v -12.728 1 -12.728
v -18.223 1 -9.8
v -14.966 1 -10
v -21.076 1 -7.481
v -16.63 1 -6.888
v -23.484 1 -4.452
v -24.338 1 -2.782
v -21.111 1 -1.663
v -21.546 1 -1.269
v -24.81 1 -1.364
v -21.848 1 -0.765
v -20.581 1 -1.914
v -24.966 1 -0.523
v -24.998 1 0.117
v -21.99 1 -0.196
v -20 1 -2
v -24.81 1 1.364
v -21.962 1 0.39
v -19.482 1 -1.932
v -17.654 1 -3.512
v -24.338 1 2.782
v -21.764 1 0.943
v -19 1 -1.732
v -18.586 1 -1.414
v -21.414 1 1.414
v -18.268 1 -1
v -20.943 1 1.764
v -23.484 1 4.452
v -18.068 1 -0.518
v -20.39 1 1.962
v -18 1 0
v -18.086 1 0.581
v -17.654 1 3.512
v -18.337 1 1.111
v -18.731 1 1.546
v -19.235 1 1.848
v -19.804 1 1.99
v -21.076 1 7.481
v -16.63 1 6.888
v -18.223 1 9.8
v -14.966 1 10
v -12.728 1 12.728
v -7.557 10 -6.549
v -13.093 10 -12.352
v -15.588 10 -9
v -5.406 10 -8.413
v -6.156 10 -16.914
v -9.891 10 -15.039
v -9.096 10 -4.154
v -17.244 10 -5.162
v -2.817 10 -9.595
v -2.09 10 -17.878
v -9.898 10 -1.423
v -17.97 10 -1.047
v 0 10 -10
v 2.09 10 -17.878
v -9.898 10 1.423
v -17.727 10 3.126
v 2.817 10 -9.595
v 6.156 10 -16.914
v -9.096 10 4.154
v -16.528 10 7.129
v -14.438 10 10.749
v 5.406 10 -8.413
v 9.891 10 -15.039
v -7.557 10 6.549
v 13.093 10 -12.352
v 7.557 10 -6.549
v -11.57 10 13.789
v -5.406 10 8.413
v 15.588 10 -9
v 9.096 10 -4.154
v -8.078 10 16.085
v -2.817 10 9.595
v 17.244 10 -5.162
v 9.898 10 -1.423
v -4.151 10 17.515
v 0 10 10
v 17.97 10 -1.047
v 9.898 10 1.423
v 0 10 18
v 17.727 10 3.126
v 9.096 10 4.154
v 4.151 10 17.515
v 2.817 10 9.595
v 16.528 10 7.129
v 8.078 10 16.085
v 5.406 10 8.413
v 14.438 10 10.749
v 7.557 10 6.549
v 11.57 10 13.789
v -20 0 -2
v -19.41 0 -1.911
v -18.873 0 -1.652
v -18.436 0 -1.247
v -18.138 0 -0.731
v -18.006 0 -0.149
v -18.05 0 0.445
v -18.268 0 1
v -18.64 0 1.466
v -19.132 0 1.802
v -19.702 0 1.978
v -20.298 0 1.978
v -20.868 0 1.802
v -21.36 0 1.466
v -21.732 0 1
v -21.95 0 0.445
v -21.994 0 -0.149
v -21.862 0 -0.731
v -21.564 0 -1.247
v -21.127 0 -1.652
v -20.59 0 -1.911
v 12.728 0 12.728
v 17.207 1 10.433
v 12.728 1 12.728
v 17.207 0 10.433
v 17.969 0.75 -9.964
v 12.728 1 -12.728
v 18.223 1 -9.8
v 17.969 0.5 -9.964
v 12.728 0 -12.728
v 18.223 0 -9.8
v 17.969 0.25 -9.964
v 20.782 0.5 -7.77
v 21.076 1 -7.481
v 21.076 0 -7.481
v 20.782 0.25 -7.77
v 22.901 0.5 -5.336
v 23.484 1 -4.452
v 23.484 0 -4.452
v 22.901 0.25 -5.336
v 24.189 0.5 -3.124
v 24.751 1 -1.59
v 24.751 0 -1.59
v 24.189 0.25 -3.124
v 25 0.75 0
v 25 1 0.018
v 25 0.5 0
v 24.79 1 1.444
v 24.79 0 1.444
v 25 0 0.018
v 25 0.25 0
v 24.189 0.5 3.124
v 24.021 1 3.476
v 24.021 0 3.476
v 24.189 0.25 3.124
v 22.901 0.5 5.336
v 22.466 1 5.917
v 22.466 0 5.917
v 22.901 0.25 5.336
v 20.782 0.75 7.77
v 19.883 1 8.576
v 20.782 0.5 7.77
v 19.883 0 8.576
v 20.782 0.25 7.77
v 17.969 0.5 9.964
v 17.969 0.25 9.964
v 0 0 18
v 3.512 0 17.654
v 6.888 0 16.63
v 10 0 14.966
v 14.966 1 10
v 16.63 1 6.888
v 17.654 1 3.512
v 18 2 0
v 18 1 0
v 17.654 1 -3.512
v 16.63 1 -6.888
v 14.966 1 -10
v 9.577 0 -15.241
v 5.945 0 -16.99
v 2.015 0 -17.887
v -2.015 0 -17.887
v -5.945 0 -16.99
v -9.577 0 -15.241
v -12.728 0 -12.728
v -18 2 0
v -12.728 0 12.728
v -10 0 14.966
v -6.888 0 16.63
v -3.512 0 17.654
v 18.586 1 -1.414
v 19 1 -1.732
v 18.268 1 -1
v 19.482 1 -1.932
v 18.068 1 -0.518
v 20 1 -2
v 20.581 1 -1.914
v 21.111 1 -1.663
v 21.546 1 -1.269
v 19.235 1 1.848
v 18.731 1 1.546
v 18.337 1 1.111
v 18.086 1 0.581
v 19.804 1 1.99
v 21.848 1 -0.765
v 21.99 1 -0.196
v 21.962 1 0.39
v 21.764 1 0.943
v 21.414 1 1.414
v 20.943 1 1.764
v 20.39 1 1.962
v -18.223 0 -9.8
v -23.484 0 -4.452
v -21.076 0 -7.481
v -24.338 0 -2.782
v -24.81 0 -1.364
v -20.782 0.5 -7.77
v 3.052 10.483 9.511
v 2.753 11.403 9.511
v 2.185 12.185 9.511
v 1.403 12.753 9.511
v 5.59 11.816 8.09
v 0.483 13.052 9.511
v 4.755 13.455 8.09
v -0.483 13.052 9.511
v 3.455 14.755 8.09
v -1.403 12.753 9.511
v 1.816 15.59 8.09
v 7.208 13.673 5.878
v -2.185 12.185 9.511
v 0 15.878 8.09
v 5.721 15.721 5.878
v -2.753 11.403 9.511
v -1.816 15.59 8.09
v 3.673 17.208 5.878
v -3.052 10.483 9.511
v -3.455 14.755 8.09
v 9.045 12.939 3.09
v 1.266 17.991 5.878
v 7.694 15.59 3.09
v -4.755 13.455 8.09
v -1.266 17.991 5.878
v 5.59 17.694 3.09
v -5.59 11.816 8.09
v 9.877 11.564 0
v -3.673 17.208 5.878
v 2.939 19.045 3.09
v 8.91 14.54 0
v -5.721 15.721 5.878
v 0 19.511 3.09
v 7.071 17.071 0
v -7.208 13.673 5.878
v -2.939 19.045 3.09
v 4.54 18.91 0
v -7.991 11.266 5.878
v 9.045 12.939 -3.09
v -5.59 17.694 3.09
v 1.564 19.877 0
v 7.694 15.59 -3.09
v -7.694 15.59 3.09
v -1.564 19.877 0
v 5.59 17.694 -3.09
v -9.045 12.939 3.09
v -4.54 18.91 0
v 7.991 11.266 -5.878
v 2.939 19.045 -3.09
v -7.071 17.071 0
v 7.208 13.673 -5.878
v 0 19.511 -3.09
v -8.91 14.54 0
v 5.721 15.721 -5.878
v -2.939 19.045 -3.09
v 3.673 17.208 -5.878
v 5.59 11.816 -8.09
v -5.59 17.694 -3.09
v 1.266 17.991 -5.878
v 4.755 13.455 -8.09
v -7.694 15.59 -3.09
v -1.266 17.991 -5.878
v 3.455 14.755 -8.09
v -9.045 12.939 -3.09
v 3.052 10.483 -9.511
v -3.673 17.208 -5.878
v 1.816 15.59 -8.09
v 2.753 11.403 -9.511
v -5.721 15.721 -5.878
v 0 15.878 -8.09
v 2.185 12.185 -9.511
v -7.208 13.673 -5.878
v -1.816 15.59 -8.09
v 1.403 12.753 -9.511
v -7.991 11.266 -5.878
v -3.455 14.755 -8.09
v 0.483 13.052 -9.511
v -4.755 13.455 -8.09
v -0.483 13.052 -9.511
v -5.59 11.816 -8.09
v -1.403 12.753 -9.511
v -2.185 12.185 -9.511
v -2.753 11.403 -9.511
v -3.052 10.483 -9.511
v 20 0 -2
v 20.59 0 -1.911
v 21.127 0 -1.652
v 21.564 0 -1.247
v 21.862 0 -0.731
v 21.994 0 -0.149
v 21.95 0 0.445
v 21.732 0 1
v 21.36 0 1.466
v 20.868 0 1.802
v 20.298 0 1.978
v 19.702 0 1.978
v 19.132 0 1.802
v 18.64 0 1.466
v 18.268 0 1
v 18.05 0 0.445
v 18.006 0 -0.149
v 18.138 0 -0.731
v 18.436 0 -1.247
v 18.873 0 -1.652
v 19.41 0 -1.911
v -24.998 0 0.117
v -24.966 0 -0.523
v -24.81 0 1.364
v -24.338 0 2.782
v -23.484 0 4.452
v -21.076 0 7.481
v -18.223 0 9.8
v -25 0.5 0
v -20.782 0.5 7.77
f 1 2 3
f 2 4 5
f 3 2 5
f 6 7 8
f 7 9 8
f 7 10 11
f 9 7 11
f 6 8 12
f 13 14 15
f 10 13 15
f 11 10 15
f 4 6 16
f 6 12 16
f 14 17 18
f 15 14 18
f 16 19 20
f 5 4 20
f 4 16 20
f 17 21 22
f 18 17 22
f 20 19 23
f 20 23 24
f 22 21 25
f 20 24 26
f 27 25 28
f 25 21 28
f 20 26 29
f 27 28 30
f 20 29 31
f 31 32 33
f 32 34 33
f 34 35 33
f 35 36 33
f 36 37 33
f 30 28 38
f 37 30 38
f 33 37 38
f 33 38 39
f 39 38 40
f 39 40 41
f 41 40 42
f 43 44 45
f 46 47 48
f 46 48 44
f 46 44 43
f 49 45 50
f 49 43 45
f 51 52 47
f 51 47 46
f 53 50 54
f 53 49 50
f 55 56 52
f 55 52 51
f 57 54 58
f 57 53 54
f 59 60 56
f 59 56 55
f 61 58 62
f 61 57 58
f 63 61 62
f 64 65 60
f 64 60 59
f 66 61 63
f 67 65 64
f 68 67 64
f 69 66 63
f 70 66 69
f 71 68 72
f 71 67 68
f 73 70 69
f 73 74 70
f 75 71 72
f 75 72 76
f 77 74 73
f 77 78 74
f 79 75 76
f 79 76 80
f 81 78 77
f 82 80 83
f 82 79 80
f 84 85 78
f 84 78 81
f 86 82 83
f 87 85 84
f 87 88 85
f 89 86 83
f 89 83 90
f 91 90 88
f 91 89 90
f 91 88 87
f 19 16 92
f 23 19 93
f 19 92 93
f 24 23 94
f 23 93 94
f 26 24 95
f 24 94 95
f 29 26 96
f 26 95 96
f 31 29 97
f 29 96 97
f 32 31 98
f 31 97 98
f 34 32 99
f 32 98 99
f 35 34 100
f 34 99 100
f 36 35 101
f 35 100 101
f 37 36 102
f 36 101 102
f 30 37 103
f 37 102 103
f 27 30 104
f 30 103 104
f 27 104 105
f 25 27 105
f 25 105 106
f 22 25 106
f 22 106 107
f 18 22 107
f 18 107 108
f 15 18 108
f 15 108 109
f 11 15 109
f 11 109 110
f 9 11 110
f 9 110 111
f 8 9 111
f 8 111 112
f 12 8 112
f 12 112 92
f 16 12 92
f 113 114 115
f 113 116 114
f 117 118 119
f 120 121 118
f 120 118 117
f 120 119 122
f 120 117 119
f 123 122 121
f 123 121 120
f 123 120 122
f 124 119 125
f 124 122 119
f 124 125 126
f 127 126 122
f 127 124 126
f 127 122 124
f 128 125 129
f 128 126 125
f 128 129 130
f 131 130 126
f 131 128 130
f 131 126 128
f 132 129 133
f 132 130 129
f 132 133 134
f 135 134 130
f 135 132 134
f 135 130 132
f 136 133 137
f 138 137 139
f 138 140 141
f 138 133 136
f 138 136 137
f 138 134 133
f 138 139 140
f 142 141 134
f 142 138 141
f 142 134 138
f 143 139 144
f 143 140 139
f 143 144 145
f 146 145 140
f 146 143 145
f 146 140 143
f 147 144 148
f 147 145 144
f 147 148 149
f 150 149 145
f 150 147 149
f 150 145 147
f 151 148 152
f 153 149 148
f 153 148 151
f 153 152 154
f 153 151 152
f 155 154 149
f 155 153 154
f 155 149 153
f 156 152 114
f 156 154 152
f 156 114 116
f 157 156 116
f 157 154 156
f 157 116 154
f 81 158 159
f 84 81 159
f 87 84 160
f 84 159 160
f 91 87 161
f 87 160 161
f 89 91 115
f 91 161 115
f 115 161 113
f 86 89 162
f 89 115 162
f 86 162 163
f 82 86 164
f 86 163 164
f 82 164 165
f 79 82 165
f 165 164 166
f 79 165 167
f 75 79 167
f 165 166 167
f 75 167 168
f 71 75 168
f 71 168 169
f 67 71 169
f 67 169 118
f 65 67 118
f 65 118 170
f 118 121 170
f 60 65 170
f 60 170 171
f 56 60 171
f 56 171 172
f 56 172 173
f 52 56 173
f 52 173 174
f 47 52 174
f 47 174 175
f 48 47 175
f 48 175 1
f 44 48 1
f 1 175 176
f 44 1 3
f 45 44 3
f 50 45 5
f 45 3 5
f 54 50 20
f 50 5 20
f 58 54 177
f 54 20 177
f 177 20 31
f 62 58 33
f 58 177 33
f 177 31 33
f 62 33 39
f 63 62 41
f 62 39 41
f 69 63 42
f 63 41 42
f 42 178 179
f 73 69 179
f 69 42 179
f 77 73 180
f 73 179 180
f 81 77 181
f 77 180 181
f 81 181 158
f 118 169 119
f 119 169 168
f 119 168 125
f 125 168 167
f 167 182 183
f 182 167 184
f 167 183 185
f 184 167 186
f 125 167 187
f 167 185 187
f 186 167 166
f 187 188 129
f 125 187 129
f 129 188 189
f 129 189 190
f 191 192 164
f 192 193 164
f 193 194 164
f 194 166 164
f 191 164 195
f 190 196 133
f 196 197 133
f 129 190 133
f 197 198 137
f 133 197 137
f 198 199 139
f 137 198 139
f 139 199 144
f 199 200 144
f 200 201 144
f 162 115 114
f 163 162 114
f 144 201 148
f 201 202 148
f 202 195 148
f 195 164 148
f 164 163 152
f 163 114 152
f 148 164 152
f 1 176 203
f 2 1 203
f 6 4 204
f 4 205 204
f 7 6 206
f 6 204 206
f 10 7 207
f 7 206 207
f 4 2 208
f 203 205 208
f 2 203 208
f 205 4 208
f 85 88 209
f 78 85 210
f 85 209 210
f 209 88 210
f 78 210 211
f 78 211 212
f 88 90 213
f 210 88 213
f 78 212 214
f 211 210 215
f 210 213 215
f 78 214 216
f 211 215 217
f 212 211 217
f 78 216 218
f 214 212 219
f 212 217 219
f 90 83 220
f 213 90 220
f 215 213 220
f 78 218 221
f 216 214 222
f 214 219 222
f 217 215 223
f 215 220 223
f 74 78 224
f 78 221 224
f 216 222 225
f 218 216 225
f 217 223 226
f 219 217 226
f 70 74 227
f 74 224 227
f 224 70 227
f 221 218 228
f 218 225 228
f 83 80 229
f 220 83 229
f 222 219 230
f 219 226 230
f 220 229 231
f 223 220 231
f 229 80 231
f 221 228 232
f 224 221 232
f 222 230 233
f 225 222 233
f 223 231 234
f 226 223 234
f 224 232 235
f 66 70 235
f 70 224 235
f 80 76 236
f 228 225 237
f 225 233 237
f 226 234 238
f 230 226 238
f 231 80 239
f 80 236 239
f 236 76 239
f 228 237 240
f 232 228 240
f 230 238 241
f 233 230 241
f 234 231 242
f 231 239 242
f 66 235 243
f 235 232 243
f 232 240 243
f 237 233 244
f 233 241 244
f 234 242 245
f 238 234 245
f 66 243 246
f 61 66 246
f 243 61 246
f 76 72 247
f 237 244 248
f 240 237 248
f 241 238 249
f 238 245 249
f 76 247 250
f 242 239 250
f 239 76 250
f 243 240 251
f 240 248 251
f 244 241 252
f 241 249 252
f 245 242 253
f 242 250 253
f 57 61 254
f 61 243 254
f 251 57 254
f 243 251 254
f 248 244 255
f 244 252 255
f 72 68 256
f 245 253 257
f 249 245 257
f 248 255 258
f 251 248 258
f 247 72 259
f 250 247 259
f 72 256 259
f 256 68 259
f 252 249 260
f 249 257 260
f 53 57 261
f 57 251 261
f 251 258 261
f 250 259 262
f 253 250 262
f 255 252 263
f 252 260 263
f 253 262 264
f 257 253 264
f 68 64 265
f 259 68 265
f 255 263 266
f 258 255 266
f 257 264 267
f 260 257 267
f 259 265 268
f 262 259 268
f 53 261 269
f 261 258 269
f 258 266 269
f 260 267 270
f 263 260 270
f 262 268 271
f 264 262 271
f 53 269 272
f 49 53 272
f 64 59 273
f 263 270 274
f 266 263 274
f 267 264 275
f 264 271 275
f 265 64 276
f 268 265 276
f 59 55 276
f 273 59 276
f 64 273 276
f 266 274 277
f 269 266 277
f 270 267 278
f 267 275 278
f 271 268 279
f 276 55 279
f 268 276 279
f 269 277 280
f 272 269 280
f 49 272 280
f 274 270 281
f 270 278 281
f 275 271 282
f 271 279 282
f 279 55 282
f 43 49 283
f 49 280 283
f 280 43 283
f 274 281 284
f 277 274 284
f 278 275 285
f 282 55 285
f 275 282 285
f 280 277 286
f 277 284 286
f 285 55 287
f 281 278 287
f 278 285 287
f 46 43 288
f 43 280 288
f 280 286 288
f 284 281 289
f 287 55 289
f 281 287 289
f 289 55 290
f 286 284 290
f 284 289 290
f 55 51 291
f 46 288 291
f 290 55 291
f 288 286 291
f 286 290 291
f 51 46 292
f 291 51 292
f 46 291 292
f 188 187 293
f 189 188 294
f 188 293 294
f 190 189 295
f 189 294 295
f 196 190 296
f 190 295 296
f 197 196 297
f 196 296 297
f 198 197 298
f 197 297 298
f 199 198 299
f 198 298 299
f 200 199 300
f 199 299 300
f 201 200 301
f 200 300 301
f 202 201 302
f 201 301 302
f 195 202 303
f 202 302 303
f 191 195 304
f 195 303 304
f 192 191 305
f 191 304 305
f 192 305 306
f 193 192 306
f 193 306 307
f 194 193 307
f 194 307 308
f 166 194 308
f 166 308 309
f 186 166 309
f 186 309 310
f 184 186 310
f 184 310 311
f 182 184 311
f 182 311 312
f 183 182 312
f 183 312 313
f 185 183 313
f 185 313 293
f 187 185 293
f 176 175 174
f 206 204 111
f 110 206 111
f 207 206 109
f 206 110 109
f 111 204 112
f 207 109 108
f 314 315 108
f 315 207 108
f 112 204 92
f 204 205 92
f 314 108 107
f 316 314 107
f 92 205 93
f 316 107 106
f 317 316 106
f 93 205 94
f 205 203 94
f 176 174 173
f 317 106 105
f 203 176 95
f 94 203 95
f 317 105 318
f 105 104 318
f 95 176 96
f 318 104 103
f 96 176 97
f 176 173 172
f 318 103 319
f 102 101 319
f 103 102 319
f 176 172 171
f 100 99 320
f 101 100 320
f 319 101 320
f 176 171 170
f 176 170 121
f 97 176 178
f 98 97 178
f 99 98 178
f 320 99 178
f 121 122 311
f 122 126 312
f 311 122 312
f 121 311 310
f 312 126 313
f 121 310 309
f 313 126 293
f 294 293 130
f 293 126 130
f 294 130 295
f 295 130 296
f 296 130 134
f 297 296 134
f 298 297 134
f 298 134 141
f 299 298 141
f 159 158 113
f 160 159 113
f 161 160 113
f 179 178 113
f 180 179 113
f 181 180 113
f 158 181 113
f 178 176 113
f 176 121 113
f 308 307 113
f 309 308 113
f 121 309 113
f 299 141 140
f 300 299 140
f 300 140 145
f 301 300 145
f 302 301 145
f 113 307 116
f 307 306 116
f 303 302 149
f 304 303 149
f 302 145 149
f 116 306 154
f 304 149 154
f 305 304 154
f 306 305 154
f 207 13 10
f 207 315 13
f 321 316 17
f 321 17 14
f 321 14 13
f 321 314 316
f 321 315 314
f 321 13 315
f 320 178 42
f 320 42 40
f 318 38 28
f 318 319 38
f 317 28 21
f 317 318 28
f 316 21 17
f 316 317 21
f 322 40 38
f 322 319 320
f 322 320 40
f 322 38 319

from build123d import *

# Parameters (mm, degrees)
SKETCH1_R            = 18
BOSS_EXTRUDE1_DEPTH  = 10
SKETCH2_R            = 2
BOSS_EXTRUDE11_DEPTH = 1
SKETCH3_R            = 2
CUT_EXTRUDE1_DEPTH   = 2


with BuildPart() as part:
    # Sketch1 → Boss-Extrude1 (new body)
    with BuildSketch(Plane(origin=(0, 0, 0), x_dir=(1, 0, 0), z_dir=(0, 1, 0))):
        with Locations(Location((0, 0, 0), (0, 0, 270))):
            Circle(SKETCH1_R)
    extrude(amount=BOSS_EXTRUDE1_DEPTH)

    # Sketch2 → Boss-Extrude11 (add)
    with BuildSketch(Plane.XZ):
        with BuildLine():
            ThreePointArc((-12.727922061, -12.727922061), (-16.629831585, -6.888301783), (-18, 0))
            ThreePointArc((-18, 0), (-16.629831585, 6.888301783), (-12.727922061, 12.727922061))
            add(Edge.make_bspline(
                [(-12.727922061, 12.727922061), (-17.413514116, 10.578941286), (-22.725992236, 6.653009013), (-24.419739959, 2.952843449), (-24.810237614, 1.3644098)],
                knots=[0, 0, 0, 0, 0.294966877, 0.815844303, 0.815844303, 0.815844303, 0.815844303], degree=3))
            add(Edge.make_bspline(
                [(-24.810237614, 1.3644098), (-24.948297671, 0.80282066), (-25, 0.337972177), (-25, 0)],
                knots=[0.815844303, 0.815844303, 0.815844303, 0.815844303, 1, 1, 1, 1], degree=3))
            add(Edge.make_bspline(
                [(-24.810237614, -1.3644098), (-24.948297671, -0.80282066), (-25, -0.337972177), (-25, 0)],
                knots=[0.815844303, 0.815844303, 0.815844303, 0.815844303, 1, 1, 1, 1], degree=3))
            add(Edge.make_bspline(
                [(-12.727922061, -12.727922061), (-17.413514116, -10.578941286), (-22.725992236, -6.653009013), (-24.419739959, -2.952843449), (-24.810237614, -1.3644098)],
                knots=[0, 0, 0, 0, 0.294966877, 0.815844303, 0.815844303, 0.815844303, 0.815844303], degree=3))
        make_face()
        with Locations((-20, 0)):
            Circle(SKETCH2_R, mode=Mode.SUBTRACT)
        with Locations((-20, 0)):
            Circle(SKETCH2_R)
        with BuildLine():
            ThreePointArc((12.727922061, 12.727922061), (16.629831585, 6.888301783), (18, 2e-09))
            ThreePointArc((18, 2e-09), (16.629831586, -6.888301782), (12.727922061, -12.727922061))
            add(Edge.make_bspline(
                [(12.727922061, -12.727922061), (17.413514116, -10.578941286), (23.925146422, -5.766831599), (25, -1.293913703), (25, 0)],
                knots=[0, 0, 0, 0, 0.294966877, 1, 1, 1, 1], degree=3))
            add(Edge.make_bspline(
                [(12.727922061, 12.727922061), (17.413514116, 10.578941286), (23.925146422, 5.766831599), (25, 1.293913703), (25, 0)],
                knots=[0, 0, 0, 0, 0.294966877, 1, 1, 1, 1], degree=3))
        make_face()
        with BuildLine():
            ThreePointArc((18, 2e-09), (20.000000001, 2), (22, 0))
            ThreePointArc((22, 0), (19.999999999, -2), (18, 2e-09))
        make_face(mode=Mode.SUBTRACT)
        with BuildLine():
            ThreePointArc((18, 2e-09), (19.999999999, -2), (22, 0))
            ThreePointArc((22, 0), (20.000000001, 2), (18, 2e-09))
        make_face()
    extrude(amount=-BOSS_EXTRUDE11_DEPTH)

    # Sketch3 → Cut-Extrude1 (cut)
    with BuildSketch(Plane.XZ):
        with Locations(Location((-20, 0, 0), (0, 0, 270))):
            Circle(SKETCH3_R)
        with Locations(Location((20, 0, 0), (0, 0, 270))):
            Circle(SKETCH3_R)
    extrude(amount=-CUT_EXTRUDE1_DEPTH, mode=Mode.SUBTRACT)

    # Sketch4 → Revolve1 (revolve)
    with BuildSketch(Plane(origin=(0, 10, 0), x_dir=(1, 0, 0), z_dir=(0, 1, 0))):
        with BuildLine():
            Line((0, 10), (0, -10))
            ThreePointArc((0, -10), (10, 0), (0, 10))
        make_face()
    revolve(axis=Axis((0, 10, -19.956600841), (0, 0, 1)))


solid = part.part
